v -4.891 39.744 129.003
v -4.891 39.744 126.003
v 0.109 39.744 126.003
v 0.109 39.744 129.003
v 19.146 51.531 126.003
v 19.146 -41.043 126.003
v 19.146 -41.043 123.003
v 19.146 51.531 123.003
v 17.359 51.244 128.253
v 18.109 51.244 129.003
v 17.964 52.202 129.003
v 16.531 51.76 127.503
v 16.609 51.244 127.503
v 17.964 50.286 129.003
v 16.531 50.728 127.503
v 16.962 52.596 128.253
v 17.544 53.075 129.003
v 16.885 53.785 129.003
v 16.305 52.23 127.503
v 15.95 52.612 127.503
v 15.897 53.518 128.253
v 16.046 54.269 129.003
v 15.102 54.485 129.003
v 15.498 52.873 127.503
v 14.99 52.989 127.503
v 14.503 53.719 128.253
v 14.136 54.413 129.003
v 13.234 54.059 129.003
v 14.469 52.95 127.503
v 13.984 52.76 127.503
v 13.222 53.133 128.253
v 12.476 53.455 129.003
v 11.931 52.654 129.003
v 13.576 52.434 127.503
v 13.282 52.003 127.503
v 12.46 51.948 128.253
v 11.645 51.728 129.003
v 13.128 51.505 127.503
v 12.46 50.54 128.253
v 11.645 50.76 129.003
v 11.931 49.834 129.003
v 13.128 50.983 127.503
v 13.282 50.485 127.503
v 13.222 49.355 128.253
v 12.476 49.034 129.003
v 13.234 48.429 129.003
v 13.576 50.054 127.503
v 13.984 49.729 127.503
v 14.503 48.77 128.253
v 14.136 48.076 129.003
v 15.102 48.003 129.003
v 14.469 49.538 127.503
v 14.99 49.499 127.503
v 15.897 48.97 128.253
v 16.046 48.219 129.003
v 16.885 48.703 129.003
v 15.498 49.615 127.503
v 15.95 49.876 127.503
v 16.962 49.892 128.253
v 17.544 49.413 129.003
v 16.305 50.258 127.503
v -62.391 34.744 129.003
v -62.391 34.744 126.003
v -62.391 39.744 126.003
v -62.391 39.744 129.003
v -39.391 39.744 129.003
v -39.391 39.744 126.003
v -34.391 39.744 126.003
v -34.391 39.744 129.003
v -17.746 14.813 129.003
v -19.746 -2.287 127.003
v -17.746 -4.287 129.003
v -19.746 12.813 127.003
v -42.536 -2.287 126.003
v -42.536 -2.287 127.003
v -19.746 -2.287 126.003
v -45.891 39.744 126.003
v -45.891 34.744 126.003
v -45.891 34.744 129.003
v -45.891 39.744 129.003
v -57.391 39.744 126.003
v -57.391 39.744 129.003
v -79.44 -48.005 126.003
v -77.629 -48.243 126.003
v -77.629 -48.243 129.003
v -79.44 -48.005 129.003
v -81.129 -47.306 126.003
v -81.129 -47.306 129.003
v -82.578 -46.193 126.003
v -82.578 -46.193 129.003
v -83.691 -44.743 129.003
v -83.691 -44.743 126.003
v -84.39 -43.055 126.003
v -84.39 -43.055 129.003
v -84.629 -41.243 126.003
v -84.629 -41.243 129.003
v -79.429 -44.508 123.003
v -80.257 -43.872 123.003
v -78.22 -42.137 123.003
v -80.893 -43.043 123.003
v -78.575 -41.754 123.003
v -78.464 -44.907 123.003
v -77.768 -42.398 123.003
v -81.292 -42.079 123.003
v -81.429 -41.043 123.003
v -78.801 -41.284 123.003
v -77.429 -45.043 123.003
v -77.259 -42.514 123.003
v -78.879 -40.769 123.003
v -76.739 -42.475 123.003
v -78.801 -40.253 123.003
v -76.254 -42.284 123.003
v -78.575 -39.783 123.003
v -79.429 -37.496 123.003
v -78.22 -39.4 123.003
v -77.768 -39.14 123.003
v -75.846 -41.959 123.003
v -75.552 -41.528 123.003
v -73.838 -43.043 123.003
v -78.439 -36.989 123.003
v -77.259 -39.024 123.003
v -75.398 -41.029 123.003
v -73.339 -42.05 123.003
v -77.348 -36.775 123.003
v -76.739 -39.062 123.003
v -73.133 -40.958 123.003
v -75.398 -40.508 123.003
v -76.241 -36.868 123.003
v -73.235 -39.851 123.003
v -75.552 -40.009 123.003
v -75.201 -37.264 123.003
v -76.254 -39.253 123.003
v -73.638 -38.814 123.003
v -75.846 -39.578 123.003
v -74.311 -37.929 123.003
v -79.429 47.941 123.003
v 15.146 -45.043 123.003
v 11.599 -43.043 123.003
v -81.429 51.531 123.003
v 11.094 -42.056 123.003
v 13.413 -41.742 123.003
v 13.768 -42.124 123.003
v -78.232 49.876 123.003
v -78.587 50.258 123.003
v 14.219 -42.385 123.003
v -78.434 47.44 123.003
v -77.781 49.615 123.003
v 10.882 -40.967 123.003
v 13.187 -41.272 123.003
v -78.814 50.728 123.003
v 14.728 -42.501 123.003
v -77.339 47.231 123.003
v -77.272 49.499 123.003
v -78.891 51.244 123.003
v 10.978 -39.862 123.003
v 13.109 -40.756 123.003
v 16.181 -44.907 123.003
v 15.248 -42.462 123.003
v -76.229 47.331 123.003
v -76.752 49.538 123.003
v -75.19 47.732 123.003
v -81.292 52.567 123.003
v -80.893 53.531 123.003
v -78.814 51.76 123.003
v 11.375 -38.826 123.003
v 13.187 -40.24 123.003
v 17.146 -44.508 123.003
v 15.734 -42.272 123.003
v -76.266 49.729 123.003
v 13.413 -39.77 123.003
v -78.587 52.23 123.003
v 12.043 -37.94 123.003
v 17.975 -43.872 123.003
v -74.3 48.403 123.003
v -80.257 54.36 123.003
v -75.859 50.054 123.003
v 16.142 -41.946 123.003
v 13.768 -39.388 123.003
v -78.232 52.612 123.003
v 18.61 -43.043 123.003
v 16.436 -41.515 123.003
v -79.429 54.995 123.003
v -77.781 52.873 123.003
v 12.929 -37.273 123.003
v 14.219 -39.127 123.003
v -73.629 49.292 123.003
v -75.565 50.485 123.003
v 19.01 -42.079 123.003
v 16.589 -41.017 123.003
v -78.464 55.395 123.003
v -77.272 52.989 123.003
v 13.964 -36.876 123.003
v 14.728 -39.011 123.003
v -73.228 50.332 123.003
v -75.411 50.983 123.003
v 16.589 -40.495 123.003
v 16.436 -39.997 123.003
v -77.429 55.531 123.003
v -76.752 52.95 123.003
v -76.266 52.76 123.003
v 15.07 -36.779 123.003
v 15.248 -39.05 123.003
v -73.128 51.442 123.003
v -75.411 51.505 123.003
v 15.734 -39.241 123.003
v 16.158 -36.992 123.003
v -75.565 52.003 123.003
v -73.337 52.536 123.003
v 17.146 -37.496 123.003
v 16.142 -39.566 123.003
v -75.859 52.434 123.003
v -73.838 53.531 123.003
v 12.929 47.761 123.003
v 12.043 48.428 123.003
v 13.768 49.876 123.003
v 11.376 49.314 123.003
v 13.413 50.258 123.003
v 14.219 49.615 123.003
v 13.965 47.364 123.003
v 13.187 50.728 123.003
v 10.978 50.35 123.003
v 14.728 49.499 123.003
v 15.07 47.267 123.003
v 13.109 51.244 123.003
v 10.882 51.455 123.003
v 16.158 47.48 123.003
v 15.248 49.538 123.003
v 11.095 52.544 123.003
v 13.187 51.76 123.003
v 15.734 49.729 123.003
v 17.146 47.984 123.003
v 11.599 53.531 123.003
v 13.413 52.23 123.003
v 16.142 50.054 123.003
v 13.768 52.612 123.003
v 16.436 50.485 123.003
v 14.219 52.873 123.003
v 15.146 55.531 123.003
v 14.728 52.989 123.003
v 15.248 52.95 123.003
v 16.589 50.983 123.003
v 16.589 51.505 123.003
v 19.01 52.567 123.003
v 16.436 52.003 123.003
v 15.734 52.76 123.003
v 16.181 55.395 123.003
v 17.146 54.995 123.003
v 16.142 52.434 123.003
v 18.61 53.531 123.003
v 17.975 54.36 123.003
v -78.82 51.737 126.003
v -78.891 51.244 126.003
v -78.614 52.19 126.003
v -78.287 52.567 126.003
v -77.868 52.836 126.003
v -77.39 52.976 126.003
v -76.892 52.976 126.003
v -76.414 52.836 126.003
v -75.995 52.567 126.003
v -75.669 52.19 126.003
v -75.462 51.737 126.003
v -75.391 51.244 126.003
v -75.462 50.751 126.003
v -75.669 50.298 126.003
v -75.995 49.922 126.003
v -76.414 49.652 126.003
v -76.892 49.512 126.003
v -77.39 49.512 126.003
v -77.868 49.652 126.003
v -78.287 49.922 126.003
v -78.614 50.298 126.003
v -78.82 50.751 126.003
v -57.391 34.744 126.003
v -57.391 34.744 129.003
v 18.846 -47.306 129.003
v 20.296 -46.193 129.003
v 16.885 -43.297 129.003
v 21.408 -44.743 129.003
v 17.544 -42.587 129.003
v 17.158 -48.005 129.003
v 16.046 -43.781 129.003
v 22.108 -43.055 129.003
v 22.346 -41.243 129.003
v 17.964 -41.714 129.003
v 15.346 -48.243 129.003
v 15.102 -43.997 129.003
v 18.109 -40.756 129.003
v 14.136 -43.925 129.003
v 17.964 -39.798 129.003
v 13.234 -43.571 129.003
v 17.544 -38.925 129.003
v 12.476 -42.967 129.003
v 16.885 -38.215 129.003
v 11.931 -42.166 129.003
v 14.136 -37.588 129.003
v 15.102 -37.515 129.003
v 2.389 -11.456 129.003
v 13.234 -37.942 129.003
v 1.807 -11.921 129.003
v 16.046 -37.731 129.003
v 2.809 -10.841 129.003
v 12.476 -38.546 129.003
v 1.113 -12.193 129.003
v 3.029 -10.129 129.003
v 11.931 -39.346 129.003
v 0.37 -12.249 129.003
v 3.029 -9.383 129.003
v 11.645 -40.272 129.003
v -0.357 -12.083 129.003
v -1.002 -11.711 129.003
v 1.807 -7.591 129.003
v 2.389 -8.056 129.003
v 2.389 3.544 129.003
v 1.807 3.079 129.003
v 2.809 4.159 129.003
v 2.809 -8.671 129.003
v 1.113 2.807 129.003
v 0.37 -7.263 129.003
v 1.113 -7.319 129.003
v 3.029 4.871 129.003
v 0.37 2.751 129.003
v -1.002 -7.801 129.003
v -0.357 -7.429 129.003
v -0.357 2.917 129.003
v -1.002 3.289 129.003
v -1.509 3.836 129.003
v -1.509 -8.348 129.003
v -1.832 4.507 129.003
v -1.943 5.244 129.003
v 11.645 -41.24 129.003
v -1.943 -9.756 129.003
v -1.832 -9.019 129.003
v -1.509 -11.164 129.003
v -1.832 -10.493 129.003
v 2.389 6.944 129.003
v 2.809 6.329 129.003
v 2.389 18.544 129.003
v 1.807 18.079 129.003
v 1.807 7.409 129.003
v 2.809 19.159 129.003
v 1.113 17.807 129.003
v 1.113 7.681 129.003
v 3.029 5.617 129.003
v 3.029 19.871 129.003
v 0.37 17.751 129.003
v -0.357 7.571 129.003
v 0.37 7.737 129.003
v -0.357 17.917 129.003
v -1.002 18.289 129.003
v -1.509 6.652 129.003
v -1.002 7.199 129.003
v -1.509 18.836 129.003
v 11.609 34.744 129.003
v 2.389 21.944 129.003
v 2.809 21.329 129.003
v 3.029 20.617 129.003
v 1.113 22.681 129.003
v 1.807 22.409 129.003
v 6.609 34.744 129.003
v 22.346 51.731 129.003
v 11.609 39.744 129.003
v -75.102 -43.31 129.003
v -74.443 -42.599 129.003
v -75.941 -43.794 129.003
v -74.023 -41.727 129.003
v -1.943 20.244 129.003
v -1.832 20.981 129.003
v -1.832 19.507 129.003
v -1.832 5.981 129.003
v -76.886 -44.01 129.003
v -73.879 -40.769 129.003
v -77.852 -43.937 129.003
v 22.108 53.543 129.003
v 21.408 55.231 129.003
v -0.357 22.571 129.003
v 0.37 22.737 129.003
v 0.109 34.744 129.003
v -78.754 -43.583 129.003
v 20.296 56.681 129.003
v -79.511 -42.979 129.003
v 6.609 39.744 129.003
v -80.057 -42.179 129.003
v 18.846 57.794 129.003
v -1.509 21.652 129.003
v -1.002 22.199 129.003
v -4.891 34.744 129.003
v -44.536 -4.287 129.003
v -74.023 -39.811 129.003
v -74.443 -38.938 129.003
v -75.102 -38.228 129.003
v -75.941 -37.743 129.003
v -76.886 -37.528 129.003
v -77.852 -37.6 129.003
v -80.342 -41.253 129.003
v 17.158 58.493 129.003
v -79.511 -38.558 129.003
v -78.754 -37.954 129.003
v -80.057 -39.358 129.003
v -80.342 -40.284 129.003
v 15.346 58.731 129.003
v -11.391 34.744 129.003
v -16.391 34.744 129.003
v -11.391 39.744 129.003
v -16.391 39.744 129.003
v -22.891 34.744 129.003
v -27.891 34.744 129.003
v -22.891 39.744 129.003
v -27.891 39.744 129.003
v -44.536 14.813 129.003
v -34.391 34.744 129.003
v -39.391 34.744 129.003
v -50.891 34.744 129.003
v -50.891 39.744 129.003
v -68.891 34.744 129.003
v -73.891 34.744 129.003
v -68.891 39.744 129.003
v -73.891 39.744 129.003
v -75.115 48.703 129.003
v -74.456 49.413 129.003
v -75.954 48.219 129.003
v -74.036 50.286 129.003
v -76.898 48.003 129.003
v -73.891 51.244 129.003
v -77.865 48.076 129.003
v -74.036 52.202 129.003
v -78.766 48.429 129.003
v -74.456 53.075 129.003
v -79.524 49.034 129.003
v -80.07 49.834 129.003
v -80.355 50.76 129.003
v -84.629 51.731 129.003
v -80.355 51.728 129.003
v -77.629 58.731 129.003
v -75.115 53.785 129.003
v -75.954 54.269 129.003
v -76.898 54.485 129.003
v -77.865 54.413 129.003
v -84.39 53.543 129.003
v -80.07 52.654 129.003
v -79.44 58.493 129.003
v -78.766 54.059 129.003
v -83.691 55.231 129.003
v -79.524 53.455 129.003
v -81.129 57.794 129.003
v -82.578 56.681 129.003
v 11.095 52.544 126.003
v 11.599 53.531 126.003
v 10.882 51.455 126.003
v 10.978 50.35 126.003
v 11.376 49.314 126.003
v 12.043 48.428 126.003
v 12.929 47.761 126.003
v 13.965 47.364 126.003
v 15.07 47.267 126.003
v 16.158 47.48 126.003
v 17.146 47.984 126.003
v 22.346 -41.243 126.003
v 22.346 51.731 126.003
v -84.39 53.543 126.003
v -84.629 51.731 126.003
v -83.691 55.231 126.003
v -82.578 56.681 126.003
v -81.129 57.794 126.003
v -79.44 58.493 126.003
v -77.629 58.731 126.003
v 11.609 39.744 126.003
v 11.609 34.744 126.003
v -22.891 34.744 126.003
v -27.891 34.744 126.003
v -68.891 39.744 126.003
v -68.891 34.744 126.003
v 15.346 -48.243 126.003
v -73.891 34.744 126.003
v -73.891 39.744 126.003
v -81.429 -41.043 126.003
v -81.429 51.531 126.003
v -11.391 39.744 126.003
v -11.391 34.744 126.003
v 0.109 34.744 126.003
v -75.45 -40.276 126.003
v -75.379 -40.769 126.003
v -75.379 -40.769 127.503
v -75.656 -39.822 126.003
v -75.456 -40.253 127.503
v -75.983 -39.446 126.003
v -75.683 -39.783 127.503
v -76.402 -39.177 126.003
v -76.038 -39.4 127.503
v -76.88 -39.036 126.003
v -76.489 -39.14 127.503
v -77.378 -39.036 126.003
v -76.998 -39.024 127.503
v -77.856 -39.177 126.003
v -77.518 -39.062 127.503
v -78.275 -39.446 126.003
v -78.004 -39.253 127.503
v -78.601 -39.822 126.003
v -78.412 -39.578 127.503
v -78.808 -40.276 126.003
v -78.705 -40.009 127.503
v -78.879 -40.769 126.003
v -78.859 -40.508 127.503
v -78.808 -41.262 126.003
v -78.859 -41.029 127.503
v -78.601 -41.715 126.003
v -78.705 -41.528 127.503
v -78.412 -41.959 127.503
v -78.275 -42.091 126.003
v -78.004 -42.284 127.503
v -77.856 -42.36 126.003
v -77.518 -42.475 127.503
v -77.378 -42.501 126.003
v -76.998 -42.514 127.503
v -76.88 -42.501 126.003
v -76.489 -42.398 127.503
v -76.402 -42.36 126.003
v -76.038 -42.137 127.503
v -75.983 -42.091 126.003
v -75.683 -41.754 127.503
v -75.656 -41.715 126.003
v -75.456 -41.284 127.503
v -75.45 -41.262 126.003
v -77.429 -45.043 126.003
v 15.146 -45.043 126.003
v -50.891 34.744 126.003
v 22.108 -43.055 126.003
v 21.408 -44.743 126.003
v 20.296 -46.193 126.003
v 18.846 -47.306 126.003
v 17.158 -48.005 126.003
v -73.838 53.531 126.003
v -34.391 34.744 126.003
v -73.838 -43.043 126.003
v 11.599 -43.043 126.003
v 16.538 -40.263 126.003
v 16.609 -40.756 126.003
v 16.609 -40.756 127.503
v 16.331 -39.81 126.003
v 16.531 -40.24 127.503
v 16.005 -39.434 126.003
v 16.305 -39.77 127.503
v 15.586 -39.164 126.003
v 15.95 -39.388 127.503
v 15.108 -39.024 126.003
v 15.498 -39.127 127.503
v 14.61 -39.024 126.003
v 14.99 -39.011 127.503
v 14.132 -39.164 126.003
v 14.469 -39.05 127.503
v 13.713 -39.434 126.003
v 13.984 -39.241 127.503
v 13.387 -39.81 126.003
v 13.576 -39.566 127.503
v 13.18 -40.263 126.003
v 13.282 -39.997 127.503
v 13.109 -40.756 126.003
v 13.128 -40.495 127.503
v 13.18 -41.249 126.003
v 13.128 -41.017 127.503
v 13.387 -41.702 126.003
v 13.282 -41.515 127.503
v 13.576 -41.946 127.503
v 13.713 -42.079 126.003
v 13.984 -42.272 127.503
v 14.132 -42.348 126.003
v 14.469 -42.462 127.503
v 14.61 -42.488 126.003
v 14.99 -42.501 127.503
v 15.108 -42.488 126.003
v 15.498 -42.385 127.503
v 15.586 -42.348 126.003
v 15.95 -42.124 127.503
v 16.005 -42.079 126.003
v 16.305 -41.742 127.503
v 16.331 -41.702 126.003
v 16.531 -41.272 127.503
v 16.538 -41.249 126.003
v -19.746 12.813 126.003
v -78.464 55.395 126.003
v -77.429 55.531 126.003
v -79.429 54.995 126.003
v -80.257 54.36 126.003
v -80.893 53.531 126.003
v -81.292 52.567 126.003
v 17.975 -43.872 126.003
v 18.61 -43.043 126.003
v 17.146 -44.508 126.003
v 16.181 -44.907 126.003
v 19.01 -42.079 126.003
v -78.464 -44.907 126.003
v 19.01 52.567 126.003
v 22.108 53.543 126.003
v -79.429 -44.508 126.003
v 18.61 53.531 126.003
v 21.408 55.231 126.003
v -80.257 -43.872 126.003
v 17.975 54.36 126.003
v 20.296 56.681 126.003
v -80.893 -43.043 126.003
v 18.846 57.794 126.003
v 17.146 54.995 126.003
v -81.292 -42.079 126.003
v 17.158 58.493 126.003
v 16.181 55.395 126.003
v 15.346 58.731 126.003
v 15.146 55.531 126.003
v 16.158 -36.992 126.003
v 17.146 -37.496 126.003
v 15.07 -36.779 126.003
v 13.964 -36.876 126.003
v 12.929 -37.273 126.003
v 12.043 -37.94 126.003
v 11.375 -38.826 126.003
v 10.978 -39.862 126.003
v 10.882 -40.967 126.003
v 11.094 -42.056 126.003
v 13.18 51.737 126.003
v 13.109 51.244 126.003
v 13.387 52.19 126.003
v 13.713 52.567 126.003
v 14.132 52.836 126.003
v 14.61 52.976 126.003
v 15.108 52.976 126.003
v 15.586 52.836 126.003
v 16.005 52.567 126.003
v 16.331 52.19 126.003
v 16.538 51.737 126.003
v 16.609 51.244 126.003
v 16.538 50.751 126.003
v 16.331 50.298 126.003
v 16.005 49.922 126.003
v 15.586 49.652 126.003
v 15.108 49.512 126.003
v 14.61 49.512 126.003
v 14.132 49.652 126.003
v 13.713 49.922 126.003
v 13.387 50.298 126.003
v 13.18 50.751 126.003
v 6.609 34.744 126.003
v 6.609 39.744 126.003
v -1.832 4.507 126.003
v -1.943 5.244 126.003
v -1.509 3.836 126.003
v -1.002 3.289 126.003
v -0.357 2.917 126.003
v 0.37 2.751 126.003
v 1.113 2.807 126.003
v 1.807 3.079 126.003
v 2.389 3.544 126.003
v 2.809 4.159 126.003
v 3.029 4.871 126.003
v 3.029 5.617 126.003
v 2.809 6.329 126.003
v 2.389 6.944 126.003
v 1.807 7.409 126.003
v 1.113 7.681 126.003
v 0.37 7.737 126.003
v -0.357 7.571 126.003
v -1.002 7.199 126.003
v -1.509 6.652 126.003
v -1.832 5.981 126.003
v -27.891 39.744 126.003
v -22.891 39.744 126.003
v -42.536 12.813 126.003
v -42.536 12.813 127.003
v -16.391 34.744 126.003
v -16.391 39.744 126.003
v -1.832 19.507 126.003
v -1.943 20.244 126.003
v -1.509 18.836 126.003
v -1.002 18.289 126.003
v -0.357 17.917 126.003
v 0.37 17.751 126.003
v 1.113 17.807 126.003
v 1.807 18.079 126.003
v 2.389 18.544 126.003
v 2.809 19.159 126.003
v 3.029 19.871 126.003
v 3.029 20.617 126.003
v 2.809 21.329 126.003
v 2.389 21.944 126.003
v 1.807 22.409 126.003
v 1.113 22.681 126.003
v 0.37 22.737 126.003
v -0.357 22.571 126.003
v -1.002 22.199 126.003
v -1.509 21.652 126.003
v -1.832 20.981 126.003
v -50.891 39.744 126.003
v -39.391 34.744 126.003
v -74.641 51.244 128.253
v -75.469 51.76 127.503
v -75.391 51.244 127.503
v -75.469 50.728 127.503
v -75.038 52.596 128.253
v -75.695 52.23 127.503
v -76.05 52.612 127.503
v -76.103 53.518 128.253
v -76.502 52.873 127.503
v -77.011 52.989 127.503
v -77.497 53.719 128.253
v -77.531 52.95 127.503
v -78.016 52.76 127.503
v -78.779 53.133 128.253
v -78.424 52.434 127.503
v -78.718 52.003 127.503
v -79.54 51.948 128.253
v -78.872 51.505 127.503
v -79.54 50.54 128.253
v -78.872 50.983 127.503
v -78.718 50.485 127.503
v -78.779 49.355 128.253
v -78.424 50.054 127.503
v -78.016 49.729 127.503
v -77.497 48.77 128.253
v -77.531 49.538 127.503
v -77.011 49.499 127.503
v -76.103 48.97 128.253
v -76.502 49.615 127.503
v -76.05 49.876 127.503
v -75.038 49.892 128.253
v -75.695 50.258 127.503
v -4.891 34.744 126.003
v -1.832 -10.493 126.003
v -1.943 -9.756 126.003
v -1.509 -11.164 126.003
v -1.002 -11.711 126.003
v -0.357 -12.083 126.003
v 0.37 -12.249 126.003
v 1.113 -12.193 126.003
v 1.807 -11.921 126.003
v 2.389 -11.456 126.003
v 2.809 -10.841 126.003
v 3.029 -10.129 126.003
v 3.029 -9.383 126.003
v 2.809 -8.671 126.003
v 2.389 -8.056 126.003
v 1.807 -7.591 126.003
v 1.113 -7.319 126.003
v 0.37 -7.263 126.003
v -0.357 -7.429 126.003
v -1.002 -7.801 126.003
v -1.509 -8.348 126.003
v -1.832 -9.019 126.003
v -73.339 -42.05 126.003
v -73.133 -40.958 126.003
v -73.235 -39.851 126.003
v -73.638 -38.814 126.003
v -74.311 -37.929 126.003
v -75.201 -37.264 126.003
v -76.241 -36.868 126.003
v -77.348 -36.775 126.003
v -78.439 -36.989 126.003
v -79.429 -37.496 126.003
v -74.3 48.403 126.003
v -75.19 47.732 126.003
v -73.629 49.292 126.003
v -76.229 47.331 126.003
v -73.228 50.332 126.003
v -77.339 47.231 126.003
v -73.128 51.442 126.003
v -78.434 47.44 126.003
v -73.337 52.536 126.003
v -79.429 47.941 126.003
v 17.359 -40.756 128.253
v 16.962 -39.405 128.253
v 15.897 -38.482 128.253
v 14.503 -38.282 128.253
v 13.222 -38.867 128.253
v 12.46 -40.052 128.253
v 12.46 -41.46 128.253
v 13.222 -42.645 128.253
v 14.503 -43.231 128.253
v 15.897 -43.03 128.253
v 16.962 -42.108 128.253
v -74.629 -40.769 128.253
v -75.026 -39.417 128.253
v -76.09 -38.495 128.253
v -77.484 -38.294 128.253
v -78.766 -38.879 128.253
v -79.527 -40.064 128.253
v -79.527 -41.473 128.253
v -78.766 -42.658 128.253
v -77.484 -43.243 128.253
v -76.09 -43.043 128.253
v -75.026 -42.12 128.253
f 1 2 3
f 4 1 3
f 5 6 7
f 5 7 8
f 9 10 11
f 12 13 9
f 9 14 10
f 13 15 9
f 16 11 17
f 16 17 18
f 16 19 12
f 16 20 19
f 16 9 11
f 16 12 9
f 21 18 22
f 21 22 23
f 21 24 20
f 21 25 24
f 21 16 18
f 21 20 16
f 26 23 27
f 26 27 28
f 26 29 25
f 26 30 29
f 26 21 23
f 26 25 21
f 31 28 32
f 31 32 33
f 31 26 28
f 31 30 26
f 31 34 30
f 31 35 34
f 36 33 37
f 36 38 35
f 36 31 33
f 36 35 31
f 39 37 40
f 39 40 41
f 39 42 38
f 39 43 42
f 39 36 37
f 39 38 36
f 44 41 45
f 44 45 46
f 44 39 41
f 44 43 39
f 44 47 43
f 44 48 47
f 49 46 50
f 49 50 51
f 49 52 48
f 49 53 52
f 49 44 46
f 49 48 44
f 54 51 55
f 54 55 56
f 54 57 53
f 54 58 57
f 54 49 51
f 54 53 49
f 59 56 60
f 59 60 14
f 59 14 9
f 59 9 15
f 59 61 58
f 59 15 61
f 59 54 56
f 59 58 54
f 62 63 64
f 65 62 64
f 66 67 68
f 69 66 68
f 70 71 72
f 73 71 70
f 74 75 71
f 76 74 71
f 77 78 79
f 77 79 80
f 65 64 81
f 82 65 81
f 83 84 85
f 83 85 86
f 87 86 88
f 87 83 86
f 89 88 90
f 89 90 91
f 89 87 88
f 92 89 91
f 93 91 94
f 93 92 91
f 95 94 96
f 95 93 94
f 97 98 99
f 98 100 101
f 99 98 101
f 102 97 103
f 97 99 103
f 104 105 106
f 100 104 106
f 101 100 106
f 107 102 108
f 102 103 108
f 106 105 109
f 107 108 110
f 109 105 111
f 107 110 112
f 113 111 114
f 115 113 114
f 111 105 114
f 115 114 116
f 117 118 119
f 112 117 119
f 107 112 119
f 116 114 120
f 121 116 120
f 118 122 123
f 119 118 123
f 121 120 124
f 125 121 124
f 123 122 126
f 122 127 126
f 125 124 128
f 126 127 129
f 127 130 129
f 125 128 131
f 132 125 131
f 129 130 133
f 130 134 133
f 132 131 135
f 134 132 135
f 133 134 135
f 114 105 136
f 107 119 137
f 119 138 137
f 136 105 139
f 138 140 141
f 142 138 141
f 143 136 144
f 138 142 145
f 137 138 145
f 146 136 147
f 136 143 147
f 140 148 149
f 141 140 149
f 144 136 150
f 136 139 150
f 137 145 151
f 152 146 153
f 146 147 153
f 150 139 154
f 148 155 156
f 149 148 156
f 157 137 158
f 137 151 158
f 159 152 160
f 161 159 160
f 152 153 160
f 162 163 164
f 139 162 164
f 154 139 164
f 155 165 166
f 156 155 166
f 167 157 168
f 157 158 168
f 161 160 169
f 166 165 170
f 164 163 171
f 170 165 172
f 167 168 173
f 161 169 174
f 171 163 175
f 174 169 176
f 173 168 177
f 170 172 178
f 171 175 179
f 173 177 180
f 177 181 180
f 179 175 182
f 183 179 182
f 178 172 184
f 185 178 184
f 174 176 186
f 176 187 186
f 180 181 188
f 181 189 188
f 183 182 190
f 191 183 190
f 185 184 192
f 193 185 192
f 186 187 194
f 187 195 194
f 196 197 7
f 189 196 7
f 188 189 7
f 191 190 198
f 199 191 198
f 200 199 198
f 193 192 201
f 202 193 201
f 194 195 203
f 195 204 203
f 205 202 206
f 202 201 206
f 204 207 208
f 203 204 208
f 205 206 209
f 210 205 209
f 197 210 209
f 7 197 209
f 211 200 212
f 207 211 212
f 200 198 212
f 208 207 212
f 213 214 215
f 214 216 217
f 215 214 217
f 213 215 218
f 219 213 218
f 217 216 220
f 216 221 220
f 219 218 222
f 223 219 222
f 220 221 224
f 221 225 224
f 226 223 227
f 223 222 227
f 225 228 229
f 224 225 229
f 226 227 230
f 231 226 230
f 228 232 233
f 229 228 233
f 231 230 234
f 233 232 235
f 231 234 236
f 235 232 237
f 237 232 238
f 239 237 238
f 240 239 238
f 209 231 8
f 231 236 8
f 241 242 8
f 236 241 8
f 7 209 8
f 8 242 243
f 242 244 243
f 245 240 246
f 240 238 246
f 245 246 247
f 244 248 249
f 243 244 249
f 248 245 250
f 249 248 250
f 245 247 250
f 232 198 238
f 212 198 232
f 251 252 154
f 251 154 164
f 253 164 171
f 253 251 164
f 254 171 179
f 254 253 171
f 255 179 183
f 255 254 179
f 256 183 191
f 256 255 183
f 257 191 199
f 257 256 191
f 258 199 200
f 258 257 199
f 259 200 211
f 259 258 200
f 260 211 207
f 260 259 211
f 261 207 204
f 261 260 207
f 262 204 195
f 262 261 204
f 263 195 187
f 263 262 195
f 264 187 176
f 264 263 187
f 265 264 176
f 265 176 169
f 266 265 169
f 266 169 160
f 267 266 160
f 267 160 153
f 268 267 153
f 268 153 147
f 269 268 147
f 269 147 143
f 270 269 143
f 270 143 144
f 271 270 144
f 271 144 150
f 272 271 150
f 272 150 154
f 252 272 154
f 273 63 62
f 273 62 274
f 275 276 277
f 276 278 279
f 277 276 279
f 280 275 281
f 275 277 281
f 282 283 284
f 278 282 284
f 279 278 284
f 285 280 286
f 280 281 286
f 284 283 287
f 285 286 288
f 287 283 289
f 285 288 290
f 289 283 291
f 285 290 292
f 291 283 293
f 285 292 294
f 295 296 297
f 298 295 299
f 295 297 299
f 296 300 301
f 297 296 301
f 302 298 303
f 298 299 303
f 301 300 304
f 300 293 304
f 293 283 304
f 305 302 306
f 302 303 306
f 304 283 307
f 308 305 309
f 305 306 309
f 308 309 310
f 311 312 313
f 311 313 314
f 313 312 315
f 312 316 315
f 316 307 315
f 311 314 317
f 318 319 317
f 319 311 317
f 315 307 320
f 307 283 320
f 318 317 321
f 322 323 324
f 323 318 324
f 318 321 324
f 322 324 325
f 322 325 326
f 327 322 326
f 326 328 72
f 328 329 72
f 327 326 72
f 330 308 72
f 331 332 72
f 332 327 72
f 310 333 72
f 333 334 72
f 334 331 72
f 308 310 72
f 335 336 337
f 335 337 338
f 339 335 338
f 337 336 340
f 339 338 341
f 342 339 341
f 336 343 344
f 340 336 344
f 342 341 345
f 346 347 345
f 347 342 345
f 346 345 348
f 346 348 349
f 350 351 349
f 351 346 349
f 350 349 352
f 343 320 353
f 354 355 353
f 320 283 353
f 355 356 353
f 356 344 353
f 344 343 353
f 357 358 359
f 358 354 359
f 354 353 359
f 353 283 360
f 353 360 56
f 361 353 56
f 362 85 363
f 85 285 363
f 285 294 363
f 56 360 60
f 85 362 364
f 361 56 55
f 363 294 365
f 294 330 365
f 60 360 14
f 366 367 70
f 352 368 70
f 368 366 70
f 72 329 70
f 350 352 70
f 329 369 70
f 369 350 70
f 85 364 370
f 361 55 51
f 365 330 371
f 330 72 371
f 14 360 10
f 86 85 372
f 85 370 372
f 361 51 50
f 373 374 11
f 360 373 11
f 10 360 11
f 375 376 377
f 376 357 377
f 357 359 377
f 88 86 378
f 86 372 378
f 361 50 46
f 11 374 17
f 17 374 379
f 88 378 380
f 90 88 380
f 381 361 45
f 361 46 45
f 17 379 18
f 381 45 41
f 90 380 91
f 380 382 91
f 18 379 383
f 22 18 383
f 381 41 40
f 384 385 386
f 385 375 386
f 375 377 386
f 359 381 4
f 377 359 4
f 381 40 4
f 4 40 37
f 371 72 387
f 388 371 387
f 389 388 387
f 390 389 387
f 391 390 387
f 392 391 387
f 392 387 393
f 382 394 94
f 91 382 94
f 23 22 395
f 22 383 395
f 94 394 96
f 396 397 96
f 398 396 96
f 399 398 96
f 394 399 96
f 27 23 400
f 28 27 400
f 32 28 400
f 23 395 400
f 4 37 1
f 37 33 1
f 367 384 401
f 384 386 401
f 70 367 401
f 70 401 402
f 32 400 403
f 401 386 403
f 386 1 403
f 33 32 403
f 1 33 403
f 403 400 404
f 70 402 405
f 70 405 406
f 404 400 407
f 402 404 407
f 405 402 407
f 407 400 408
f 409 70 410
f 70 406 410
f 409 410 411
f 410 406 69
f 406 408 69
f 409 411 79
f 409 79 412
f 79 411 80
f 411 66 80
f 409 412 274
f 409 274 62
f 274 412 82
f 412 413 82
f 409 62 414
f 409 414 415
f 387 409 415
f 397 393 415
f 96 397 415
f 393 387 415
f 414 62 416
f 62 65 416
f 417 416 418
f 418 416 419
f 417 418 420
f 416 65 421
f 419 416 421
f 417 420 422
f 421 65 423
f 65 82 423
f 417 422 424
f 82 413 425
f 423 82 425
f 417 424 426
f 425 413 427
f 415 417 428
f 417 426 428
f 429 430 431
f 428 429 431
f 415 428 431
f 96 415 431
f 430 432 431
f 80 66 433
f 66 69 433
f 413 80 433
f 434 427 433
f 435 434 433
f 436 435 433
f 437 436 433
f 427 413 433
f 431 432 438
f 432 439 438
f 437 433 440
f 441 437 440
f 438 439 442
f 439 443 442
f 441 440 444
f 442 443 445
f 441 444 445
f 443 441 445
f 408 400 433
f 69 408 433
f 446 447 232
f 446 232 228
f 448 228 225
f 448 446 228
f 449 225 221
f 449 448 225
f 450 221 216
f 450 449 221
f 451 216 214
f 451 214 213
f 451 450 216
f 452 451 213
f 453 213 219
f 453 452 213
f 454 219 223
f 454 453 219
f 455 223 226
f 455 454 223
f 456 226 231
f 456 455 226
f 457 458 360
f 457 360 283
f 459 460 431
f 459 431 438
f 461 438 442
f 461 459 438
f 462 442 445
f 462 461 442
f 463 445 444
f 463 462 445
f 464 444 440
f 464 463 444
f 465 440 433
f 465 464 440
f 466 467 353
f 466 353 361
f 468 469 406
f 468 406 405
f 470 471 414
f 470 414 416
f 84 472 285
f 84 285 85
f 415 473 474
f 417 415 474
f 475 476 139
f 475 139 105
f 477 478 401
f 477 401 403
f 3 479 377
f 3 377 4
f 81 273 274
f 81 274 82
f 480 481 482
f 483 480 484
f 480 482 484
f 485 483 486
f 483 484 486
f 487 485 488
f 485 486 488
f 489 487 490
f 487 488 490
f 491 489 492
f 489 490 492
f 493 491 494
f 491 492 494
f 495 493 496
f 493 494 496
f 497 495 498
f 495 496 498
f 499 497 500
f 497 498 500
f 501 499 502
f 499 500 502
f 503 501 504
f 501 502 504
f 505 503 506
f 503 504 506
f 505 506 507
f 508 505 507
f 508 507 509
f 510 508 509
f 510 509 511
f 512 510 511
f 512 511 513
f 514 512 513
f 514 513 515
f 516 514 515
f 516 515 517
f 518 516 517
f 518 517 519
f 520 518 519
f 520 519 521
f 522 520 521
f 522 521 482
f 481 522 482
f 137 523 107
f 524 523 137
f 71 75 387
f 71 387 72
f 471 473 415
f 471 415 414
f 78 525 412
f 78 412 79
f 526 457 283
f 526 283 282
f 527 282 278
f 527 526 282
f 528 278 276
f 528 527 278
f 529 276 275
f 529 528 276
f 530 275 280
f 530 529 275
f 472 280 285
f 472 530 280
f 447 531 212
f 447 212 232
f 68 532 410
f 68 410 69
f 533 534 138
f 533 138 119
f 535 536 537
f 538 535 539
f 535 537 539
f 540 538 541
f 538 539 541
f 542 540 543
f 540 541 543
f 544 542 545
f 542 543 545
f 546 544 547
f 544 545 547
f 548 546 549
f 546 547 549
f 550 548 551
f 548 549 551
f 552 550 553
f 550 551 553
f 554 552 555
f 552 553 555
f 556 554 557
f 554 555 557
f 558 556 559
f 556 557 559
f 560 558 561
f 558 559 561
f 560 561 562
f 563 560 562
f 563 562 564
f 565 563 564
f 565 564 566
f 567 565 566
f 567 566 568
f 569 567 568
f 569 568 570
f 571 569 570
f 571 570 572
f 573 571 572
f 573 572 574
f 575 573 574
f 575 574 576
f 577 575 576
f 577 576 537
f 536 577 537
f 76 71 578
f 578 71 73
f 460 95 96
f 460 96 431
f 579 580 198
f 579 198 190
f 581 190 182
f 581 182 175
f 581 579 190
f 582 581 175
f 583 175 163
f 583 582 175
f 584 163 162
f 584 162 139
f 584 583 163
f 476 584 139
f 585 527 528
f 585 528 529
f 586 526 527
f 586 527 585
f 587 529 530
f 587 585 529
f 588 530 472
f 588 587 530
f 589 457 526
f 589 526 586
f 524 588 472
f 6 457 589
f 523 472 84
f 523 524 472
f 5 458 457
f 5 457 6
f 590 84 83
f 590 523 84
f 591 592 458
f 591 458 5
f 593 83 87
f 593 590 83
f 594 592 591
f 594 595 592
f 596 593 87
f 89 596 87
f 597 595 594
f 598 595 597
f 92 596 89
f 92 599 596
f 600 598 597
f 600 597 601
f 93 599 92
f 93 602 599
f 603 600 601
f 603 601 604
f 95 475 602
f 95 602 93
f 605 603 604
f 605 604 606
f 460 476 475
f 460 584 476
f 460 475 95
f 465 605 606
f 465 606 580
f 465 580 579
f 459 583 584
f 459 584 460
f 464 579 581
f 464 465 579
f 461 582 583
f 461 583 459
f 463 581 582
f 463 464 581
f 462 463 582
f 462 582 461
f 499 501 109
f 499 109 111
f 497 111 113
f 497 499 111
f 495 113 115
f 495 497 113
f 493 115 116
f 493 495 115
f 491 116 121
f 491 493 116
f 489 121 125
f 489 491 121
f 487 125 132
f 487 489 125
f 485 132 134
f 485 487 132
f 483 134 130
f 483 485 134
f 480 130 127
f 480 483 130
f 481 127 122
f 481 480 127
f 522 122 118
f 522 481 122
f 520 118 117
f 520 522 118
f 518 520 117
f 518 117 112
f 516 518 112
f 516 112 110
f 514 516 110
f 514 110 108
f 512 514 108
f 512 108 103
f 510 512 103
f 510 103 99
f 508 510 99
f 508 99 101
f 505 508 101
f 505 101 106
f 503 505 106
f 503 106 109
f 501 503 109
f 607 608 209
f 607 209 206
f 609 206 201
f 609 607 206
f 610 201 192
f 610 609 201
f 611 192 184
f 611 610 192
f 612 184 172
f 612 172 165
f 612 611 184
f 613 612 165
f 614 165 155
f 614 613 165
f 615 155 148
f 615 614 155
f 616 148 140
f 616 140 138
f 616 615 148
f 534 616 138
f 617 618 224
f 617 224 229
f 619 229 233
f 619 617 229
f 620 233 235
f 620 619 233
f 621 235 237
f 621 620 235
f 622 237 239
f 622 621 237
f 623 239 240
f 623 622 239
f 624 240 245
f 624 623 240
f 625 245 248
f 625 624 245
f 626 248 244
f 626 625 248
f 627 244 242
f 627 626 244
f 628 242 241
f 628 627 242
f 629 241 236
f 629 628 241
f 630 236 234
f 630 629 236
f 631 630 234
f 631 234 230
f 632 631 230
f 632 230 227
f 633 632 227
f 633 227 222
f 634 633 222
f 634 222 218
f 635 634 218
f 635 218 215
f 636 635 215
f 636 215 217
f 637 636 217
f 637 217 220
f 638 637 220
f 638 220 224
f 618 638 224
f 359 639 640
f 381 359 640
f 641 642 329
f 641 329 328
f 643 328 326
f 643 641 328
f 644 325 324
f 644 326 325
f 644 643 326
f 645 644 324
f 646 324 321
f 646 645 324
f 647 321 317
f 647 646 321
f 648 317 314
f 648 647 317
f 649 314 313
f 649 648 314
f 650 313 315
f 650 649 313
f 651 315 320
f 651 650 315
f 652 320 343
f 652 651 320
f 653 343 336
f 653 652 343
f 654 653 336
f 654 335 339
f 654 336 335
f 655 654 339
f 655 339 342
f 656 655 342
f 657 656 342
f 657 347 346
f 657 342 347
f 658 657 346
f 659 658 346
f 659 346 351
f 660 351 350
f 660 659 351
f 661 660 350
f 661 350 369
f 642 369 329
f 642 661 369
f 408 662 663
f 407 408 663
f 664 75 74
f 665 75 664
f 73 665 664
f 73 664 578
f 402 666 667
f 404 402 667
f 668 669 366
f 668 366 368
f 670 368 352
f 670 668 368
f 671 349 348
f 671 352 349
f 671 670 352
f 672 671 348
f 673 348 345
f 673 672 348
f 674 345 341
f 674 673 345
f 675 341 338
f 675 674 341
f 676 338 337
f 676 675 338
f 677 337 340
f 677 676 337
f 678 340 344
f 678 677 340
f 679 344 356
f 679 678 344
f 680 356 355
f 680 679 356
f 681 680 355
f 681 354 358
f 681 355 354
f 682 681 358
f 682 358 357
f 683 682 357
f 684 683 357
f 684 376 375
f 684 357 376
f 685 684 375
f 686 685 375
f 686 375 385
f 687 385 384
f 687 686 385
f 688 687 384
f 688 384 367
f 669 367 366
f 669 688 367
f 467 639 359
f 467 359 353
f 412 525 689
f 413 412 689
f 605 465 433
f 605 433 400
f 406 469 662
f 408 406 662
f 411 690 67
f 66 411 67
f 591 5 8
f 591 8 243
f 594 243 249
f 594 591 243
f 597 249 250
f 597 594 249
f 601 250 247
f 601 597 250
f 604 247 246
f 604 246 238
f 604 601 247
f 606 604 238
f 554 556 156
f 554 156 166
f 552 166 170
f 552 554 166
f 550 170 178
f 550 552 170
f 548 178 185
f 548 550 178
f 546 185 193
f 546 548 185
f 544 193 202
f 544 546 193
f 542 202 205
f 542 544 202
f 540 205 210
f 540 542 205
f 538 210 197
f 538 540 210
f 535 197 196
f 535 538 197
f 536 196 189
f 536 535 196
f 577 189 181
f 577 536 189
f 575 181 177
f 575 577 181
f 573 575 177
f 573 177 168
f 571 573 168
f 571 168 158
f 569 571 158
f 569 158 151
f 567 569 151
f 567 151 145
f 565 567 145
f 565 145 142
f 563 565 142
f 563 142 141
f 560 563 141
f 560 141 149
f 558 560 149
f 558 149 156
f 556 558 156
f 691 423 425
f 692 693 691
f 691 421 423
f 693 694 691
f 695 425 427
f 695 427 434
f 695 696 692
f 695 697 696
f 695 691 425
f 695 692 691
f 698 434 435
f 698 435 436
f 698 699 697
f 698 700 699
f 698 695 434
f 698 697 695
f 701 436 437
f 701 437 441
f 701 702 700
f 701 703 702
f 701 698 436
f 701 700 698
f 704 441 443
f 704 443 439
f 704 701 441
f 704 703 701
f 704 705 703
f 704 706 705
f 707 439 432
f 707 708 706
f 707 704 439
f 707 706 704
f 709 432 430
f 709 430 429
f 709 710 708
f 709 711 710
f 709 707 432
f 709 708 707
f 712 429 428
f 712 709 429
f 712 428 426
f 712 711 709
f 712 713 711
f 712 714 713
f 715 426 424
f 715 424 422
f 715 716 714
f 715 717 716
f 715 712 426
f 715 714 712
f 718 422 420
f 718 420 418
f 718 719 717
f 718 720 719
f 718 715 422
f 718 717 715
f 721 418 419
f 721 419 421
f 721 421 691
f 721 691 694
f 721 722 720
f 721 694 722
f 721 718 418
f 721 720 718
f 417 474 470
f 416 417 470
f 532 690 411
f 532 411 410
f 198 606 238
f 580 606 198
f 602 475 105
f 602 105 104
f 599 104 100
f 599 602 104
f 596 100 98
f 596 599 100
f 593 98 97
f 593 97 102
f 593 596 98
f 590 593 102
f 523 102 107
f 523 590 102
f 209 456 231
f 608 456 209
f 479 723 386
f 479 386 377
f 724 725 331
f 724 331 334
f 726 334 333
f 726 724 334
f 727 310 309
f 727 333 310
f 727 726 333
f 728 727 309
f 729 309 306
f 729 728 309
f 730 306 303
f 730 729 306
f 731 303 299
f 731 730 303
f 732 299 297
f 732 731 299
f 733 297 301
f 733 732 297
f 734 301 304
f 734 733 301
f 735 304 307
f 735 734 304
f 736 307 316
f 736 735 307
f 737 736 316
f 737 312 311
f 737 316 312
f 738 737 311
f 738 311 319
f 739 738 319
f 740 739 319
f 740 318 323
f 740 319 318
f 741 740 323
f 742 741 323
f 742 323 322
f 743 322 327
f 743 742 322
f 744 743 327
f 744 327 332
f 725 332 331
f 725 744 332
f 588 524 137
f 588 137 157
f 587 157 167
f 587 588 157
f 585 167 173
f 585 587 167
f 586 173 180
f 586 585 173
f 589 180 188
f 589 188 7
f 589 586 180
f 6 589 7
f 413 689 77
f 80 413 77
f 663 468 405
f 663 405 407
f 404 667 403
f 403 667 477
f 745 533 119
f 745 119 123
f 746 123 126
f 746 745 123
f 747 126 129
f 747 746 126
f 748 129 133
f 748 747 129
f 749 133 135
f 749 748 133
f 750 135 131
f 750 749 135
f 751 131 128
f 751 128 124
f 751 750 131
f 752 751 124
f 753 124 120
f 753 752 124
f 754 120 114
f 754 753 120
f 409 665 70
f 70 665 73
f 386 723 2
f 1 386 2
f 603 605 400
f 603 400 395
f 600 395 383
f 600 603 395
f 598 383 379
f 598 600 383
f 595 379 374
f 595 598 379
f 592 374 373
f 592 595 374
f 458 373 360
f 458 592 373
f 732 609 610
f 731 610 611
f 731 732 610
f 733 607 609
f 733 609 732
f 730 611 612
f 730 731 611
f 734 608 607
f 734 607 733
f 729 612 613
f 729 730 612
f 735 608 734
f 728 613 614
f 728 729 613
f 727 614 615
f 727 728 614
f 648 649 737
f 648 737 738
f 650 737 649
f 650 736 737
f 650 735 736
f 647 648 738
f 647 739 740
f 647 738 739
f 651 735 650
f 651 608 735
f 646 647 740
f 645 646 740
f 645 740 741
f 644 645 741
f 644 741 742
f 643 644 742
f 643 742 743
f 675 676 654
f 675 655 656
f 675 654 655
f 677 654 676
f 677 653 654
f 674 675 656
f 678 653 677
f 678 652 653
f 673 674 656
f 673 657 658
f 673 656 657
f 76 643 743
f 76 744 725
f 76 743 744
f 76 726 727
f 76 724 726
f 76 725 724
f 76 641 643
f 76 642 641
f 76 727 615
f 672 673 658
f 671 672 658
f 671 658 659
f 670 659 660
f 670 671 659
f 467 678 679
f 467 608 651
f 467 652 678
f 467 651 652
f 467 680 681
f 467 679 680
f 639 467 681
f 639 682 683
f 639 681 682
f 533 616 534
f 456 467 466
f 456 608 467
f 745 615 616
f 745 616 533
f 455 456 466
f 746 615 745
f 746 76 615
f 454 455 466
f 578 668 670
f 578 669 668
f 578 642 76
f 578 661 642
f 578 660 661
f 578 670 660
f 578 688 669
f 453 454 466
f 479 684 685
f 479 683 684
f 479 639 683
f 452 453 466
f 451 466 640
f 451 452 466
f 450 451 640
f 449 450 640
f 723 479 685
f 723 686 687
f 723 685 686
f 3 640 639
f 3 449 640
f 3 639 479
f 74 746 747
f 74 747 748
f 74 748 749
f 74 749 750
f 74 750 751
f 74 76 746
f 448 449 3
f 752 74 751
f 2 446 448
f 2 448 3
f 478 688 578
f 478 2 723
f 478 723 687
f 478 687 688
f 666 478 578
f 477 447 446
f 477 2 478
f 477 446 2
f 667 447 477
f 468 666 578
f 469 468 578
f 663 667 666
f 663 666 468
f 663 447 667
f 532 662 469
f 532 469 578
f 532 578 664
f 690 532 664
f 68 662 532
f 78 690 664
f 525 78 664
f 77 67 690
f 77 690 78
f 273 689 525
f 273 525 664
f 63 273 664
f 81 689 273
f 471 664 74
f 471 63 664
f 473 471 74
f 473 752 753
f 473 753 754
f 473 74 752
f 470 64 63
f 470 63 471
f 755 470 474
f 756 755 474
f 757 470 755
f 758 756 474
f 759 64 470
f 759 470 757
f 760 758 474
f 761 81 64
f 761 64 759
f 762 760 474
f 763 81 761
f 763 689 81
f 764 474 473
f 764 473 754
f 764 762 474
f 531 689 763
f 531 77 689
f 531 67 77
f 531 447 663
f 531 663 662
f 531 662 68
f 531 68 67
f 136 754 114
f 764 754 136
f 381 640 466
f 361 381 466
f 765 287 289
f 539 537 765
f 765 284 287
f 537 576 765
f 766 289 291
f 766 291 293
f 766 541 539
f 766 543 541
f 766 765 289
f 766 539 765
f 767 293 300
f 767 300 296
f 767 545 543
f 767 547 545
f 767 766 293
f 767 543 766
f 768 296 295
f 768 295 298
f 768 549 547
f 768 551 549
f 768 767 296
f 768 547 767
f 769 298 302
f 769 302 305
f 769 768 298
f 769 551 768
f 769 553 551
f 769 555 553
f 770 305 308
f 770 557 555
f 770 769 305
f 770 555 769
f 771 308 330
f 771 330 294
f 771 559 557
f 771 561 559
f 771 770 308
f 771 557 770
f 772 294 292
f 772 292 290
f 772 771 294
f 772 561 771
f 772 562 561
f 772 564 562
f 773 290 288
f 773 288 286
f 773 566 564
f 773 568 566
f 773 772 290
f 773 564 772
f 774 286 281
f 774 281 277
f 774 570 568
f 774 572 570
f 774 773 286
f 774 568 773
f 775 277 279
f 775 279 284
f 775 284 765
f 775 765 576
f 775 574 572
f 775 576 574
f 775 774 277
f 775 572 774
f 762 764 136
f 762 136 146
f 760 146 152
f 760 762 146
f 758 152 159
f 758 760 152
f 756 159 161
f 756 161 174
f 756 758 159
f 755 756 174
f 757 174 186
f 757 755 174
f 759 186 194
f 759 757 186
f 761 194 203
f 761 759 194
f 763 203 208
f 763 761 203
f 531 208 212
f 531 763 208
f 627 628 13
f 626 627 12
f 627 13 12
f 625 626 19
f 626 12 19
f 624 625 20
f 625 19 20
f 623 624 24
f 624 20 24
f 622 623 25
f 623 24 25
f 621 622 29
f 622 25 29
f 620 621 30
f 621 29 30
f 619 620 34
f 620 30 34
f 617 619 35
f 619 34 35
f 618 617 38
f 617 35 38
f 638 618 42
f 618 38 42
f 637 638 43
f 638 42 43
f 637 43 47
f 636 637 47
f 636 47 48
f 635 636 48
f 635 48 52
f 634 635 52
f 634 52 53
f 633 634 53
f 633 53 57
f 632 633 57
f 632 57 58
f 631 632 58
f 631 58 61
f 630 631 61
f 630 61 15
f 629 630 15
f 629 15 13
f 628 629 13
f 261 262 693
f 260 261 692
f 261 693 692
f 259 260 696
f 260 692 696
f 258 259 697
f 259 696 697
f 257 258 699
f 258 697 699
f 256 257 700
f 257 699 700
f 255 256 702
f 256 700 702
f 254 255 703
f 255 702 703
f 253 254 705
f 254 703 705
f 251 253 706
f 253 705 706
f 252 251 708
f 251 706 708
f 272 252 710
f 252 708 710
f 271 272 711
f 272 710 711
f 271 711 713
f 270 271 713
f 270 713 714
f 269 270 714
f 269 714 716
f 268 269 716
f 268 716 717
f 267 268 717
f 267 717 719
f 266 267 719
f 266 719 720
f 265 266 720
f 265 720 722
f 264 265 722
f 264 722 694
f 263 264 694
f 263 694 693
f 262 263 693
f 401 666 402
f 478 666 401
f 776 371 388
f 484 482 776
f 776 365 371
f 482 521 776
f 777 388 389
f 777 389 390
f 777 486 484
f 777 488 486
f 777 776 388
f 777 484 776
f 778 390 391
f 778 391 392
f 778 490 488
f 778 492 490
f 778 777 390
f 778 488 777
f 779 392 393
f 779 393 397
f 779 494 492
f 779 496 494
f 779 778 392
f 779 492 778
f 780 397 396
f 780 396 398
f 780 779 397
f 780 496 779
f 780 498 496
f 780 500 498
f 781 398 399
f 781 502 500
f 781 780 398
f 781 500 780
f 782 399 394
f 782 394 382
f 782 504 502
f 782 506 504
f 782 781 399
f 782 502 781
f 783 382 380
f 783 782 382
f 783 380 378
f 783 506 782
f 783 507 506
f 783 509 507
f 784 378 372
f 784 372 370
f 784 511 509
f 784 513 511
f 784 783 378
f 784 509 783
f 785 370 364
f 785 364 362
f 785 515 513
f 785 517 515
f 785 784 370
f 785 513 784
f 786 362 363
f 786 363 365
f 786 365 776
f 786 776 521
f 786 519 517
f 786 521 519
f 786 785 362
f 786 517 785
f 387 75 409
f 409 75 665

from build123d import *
from build123d.topology import SkipClean

# Parameters (mm, degrees)
ESTRUSIONE_ESTRUSIONE1_DEPTH  = 3
TAGLIO_ESTRUSIONE1_REACH      = 105.055
SCHIZZO2_R                    = 1.75
SMUSSO1_SIZE                  = 1.5
SCHIZZO3_W                    = 22.789608278
SCHIZZO3_H                    = 15.099999313
TAGLIO_ESTRUSIONE2_DEPTH      = 104.055261945
SMUSSO2_SIZE                  = 2
SCHIZZO4_R                    = 1.75
ESTRUSIONE_ESTRUSIONE2_DEPTH  = 3
TAGLIO_ESTRUSIONE3_DEPTH      = 104.18617647
TAGLIO_ESTRUSIONE3_DEPTH_BACK = 104.18617647
SCHIZZO5_R                    = 2.5
SCHIZZO5_W                    = 5
SCHIZZO5_H                    = 5


with BuildPart() as part:
    # Schizzo1 → Estrusione-Estrusione1 (new body)
    with BuildSketch(Plane.XY.offset(126.00326253)):
        with BuildLine():
            Line((-77.628669492, 58.731382705), (15.346131117, 58.731382705))
            ThreePointArc((15.346131117, 58.731382705), (20.295878585, 56.681130173), (22.346131117, 51.731382705))
            Line((22.346131117, 51.731382705), (22.346131117, -41.243417905))
            ThreePointArc((22.346131117, -41.243417905), (20.295878585, -46.193165373), (15.346131117, -48.243417905))
            Line((15.346131117, -48.243417905), (-77.628669492, -48.243417905))
            ThreePointArc((-77.628669492, -48.243417905), (-82.578416961, -46.193165373), (-84.628669492, -41.243417905))
            Line((-84.628669492, -41.243417905), (-84.628669492, 51.731382705))
            ThreePointArc((-84.628669492, 51.731382705), (-82.578416961, 56.681130173), (-77.628669492, 58.731382705))
        make_face()
    extrude(amount=ESTRUSIONE_ESTRUSIONE1_DEPTH)

    # Schizzo2 → Taglio-Estrusione1 (cut, up to next)
    with BuildSketch(Plane.XY.offset(129.00326253), mode=Mode.PRIVATE) as taglio_estrusione1_sk1:
        with Locations((-77.141361898, 51.24407511)):
            Circle(SCHIZZO2_R)
    taglio_estrusione1_tool1 = extrude(taglio_estrusione1_sk1.sketch, amount=-TAGLIO_ESTRUSIONE1_REACH, mode=Mode.PRIVATE) & part.part
    # Schizzo2 → Taglio-Estrusione1 (cut, up to next)
    with BuildSketch(Plane.XY.offset(129.00326253), mode=Mode.PRIVATE) as taglio_estrusione1_sk2:
        with Locations((14.858823522, 51.24407511)):
            Circle(SCHIZZO2_R)
    taglio_estrusione1_tool2 = extrude(taglio_estrusione1_sk2.sketch, amount=-TAGLIO_ESTRUSIONE1_REACH, mode=Mode.PRIVATE) & part.part
    # Schizzo2 → Taglio-Estrusione1 (cut, up to next)
    with BuildSketch(Plane.XY.offset(129.00326253), mode=Mode.PRIVATE) as taglio_estrusione1_sk3:
        with Locations((14.858823522, -40.75611031)):
            Circle(SCHIZZO2_R)
    taglio_estrusione1_tool3 = extrude(taglio_estrusione1_sk3.sketch, amount=-TAGLIO_ESTRUSIONE1_REACH, mode=Mode.PRIVATE) & part.part
    # Schizzo2 → Taglio-Estrusione1 (cut, up to next)
    with BuildSketch(Plane.XY.offset(129.00326253), mode=Mode.PRIVATE) as taglio_estrusione1_sk4:
        with Locations((-77.128669492, -40.768617295)):
            Circle(SCHIZZO2_R)
    taglio_estrusione1_tool4 = extrude(taglio_estrusione1_sk4.sketch, amount=-TAGLIO_ESTRUSIONE1_REACH, mode=Mode.PRIVATE) & part.part
    add(taglio_estrusione1_tool1.solids().sort_by_distance((-77.141362, 51.244075, 129.003263))[0], mode=Mode.SUBTRACT)
    add(taglio_estrusione1_tool2.solids().sort_by_distance((14.858824, 51.244075, 129.003263))[0], mode=Mode.SUBTRACT)
    add(taglio_estrusione1_tool3.solids().sort_by_distance((14.858824, -40.75611, 129.003263))[0], mode=Mode.SUBTRACT)
    add(taglio_estrusione1_tool4.solids().sort_by_distance((-77.128669, -40.768617, 129.003263))[0], mode=Mode.SUBTRACT)

    # Smusso1
    smusso1_edges = [part.edges().sort_by_distance(p)[0] for p in [
        (-78.878669492, -40.768617295, 129.00326253),
        (13.108823522, -40.75611031, 129.00326253),
        (13.108823522, 51.24407511, 129.00326253),
        (-78.891361898, 51.24407511, 129.00326253),
    ]]
    chamfer(smusso1_edges, length=SMUSSO1_SIZE)

    # Schizzo3 → Taglio-Estrusione2 (cut, through all)
    with BuildSketch(Plane.XY.offset(129.00326253)):
        with Locations((-31.141270458, 5.263005749)):
            Rectangle(SCHIZZO3_W, SCHIZZO3_H)
    extrude(amount=-TAGLIO_ESTRUSIONE2_DEPTH, mode=Mode.SUBTRACT)

    # Smusso2
    smusso2_edges = [part.edges().sort_by_distance(p)[0] for p in [
        (-42.536074597, 5.263005749, 129.00326253),
        (-31.141270458, -2.286993907, 129.00326253),
        (-19.746466319, 5.263005749, 129.00326253),
        (-31.141270458, 12.813005406, 129.00326253),
    ]]
    chamfer(smusso2_edges, length=SMUSSO2_SIZE)

    # Schizzo4 → Estrusione-Estrusione2 (add)
    with SkipClean():  # the faces are left unmerged after this step: merging them gives an invalid solid
        with BuildSketch(Plane(origin=(0, 0, 126.00326253), x_dir=(-1, 0, 0), z_dir=(0, 0, -1))):
            with BuildLine():
                ThreePointArc((81.428669492, -41.043417905), (80.257096617, -43.87184503), (77.428669492, -45.043417905))
                Line((77.428669492, -45.043417905), (-15.146131117, -45.043417905))
                ThreePointArc((-15.146131117, -45.043417905), (-17.974558242, -43.87184503), (-19.146131117, -41.043417905))
                Line((-19.146131117, -41.043417905), (-19.146131117, 51.531382705))
                ThreePointArc((-19.146131117, 51.531382705), (-17.974558242, 54.359809829), (-15.146131117, 55.531382705))
                Line((-15.146131117, 55.531382705), (77.428669492, 55.531382705))
                ThreePointArc((77.428669492, 55.531382705), (80.257096617, 54.359809829), (81.428669492, 51.531382705))
                Line((81.428669492, 51.531382705), (81.428669492, -41.043417905))
            make_face()
            with Locations((77.128669492, -40.768617295)):
                Circle(SCHIZZO4_R, mode=Mode.SUBTRACT)
            with Locations((-14.858823522, 51.24407511)):
                Circle(SCHIZZO4_R, mode=Mode.SUBTRACT)
            with Locations((77.141361898, 51.24407511)):
                Circle(SCHIZZO4_R, mode=Mode.SUBTRACT)
            with Locations((-14.858823522, -40.75611031)):
                Circle(SCHIZZO4_R, mode=Mode.SUBTRACT)
            with BuildLine():
                Line((79.428669492, -37.496003661), (79.428669492, 47.940721611))
                ThreePointArc((79.428669492, 47.940721611), (74.300242368, 48.40295558), (73.838008399, 53.531382705))
                Line((73.838008399, 53.531382705), (-11.599070717, 53.531382705))
                ThreePointArc((-11.599070717, 53.531382705), (-12.042996434, 48.428248021), (-17.146131117, 47.984322305))
                Line((-17.146131117, 47.984322305), (-17.146131117, -37.496196748))
                ThreePointArc((-17.146131117, -37.496196748), (-12.042903383, -37.940190171), (-11.59890996, -43.043417905))
                Line((-11.59890996, -43.043417905), (73.838489834, -43.043417905))
                ThreePointArc((73.838489834, -43.043417905), (74.31112355, -37.929350689), (79.428669492, -37.496003661))
            make_face(mode=Mode.SUBTRACT)
        extrude(amount=ESTRUSIONE_ESTRUSIONE2_DEPTH)

    # Schizzo5 → Taglio-Estrusione3 (cut, two sides: drawn at the far end of the back side and taken through both)
    with SkipClean():  # the faces are left unmerged after this step: merging them gives an invalid solid
        with BuildSketch(Plane.XY.offset(129.00326253).offset(-TAGLIO_ESTRUSIONE3_DEPTH_BACK)):
            with Locations(Location((0.556781358, -9.75605951, 0), (0, 0, 180))):
                Circle(SCHIZZO5_R)
            with Locations(Location((0.556781358, 5.24397097, 0), (0, 0, 180))):
                Circle(SCHIZZO5_R)
            with Locations(Location((0.556781358, 20.24399891, 0), (0, 0, 180))):
                Circle(SCHIZZO5_R)
            with Locations((-71.391349259, 37.244047119)):
                Rectangle(SCHIZZO5_W, SCHIZZO5_H)
            with Locations((-59.891326399, 37.244047119)):
                Rectangle(SCHIZZO5_W, SCHIZZO5_H)
            with Locations((-48.391303539, 37.244047119)):
                Rectangle(SCHIZZO5_W, SCHIZZO5_H)
            with Locations((-36.891280679, 37.244047119)):
                Rectangle(SCHIZZO5_W, SCHIZZO5_H)
            with Locations((-25.391257819, 37.244047119)):
                Rectangle(SCHIZZO5_W, SCHIZZO5_H)
            with Locations((-13.891234958, 37.244047119)):
                Rectangle(SCHIZZO5_W, SCHIZZO5_H)
            with Locations((-2.391212098, 37.244047119)):
                Rectangle(SCHIZZO5_W, SCHIZZO5_H)
            with Locations((9.108810762, 37.244047119)):
                Rectangle(SCHIZZO5_W, SCHIZZO5_H)
        extrude(amount=TAGLIO_ESTRUSIONE3_DEPTH + TAGLIO_ESTRUSIONE3_DEPTH_BACK, mode=Mode.SUBTRACT)


solid = part.part
